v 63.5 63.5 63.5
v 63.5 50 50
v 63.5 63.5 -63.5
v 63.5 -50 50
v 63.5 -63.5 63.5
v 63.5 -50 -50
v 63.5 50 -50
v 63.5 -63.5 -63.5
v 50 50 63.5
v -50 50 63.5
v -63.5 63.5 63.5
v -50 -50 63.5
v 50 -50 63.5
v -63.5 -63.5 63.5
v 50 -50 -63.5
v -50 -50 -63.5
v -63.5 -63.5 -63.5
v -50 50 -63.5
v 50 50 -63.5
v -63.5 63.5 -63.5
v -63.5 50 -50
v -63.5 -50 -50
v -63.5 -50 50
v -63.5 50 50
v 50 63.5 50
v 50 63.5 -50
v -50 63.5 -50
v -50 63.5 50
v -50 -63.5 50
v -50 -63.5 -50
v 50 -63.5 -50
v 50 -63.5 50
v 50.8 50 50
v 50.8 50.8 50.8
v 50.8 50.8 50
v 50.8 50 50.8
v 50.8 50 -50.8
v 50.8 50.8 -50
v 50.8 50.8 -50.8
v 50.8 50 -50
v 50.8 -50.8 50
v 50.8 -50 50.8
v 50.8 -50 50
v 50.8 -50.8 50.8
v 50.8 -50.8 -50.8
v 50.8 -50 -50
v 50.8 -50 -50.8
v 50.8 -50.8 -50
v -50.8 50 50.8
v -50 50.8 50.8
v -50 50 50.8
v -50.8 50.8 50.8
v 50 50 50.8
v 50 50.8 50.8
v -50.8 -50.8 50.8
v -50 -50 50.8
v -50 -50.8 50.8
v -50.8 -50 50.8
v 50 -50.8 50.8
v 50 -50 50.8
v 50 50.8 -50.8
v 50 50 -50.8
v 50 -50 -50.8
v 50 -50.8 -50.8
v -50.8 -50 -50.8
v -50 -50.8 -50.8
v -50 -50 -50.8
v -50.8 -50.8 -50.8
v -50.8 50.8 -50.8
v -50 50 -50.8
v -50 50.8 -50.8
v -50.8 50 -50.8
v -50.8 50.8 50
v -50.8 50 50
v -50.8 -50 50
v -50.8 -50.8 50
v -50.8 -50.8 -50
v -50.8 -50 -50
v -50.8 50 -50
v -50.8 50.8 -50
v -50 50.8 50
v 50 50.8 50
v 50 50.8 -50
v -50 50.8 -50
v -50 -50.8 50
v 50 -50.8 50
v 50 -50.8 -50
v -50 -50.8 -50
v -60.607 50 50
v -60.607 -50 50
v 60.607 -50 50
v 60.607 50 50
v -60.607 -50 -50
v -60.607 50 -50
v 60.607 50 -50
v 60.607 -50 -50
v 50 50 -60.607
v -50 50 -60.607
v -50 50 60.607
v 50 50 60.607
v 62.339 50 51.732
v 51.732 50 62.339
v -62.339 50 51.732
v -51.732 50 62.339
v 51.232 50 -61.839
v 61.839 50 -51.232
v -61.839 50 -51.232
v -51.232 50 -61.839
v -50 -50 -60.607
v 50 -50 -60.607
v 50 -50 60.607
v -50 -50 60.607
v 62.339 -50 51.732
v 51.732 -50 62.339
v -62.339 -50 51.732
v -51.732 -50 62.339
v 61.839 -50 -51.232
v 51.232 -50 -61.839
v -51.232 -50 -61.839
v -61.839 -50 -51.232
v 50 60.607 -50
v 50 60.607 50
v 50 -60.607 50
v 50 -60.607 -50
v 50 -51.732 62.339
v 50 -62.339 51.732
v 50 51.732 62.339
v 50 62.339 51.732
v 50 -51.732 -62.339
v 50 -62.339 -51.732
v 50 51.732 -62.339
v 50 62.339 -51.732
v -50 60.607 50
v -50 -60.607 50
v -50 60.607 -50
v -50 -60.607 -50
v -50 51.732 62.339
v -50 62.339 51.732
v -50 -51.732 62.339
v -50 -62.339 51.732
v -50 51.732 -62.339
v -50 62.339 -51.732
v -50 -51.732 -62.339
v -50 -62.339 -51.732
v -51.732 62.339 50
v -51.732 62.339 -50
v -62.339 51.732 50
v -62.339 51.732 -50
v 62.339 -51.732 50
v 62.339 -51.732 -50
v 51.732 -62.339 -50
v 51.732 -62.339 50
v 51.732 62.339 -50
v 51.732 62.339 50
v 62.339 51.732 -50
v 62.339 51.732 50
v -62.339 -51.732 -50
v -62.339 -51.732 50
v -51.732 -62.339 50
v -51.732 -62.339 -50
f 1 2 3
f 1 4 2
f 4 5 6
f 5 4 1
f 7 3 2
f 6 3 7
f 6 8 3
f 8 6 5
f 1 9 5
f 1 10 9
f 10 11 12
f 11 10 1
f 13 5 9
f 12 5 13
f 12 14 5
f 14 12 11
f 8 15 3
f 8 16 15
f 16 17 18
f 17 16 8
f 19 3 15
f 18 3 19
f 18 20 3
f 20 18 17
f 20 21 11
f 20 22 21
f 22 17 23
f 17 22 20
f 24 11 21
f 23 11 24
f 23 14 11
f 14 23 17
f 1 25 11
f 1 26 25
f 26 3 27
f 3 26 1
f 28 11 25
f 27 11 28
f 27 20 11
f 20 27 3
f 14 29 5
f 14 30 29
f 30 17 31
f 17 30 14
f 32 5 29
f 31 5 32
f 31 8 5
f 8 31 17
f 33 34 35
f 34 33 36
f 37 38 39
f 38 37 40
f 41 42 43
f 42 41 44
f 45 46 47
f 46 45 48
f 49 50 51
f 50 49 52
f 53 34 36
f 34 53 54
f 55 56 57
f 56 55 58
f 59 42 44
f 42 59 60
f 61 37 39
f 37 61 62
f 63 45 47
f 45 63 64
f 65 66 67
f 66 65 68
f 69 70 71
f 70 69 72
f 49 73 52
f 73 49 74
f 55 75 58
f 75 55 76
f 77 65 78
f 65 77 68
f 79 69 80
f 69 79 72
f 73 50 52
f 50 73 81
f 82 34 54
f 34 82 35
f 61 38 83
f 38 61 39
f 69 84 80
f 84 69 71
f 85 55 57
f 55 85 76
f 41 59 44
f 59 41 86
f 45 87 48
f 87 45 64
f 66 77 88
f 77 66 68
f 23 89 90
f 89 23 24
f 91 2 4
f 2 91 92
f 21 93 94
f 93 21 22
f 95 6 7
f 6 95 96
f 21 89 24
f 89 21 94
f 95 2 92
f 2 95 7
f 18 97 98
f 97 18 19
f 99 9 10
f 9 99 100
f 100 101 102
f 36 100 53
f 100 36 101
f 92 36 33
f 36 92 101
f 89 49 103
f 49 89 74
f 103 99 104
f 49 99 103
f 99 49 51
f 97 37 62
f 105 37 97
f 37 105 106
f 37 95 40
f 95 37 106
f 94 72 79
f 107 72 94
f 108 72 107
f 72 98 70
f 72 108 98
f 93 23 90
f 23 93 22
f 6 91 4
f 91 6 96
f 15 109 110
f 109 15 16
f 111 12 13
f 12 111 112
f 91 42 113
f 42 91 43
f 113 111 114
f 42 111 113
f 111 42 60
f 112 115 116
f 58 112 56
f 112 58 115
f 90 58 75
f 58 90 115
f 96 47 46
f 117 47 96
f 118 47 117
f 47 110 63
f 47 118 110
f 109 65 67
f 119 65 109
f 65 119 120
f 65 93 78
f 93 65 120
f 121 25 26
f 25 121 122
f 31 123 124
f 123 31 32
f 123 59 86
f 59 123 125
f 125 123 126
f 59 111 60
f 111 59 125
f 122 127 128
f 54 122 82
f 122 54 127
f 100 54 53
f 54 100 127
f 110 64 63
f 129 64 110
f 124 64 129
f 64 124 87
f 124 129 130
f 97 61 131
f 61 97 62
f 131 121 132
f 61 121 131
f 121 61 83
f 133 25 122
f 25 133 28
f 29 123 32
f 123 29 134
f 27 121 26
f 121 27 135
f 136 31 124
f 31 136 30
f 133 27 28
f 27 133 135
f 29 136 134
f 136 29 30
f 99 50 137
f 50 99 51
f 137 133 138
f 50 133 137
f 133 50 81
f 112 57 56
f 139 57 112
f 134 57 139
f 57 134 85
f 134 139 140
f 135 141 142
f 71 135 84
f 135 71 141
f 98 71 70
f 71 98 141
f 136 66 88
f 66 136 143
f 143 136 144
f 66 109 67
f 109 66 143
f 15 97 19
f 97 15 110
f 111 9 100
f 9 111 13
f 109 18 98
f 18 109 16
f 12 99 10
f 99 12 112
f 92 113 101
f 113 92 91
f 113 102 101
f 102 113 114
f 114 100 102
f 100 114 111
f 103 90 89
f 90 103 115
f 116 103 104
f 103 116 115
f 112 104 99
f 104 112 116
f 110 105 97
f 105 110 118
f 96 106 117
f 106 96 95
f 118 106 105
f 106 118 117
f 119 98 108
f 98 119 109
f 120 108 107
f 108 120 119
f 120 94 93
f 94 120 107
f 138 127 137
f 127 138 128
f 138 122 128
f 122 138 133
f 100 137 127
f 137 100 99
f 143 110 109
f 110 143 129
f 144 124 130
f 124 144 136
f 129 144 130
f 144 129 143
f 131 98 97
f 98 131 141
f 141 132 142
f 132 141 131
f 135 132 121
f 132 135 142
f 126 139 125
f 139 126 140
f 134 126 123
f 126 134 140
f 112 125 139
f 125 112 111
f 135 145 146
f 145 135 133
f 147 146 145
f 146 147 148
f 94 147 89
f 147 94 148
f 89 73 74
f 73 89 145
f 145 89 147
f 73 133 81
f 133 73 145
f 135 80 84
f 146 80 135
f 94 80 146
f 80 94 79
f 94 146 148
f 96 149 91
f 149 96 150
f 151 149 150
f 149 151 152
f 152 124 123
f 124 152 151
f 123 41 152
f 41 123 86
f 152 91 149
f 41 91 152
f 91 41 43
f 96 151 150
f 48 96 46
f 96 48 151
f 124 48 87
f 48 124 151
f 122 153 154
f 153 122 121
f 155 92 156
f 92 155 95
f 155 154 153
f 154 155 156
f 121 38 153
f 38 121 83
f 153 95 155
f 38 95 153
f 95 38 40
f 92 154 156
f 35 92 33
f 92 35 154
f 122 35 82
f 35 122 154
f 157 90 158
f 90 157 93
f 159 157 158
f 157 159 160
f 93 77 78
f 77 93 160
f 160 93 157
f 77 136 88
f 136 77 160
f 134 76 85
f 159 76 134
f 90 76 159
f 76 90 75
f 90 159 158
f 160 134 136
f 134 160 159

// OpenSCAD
module strip () {
    cube([15, 100, 10], center=true);
    }


difference () {
    cube([127,127,127], center=true);
    cube([101.6,101.6,101.6], center=true);
    translate([0, 0, 0]) rotate([0, 0, 0]) cube([200,100,100], center=true);    
    translate([0, 0, 0]) rotate([0, 0, 0]) cube([100,200,100], center=true);    
    translate([0, 0, 0]) rotate([0, 0, 0]) cube([100,100,200], center=true);  
  
    translate([53.5, 0, 53.5]) rotate([0, 45, 0])  strip();
    translate([-53.5, 0, 53.5]) rotate([0, -45, 0]) strip();
    translate([53, 0, -53]) rotate([0,  -45, 0]) strip();
    translate([-53, 0, -53]) rotate([0,  45, 0]) strip();
    
    translate([0, 53.5, 53.5]) rotate([0, 45, 90])  strip();
    translate([0, -53.5, -53.5]) rotate([0, 45, 90])  strip();
    
    translate([0, 53.5, -53.5]) rotate([0, -45, 90])  strip();
    translate([0, -53.5, 53.5]) rotate([0, -45, 90])  strip();

    translate([-53.5, 53.5, 0]) rotate([90, 0, 45])  strip();
    translate([53.5, -53.5, 0]) rotate([90, 0, 45])  strip();

    translate([53.5, 53.5, 0]) rotate([90, 0, -45])  strip();
    translate([-53.5, -53.5, 0]) rotate([90, 0, -45])  strip();
    }
